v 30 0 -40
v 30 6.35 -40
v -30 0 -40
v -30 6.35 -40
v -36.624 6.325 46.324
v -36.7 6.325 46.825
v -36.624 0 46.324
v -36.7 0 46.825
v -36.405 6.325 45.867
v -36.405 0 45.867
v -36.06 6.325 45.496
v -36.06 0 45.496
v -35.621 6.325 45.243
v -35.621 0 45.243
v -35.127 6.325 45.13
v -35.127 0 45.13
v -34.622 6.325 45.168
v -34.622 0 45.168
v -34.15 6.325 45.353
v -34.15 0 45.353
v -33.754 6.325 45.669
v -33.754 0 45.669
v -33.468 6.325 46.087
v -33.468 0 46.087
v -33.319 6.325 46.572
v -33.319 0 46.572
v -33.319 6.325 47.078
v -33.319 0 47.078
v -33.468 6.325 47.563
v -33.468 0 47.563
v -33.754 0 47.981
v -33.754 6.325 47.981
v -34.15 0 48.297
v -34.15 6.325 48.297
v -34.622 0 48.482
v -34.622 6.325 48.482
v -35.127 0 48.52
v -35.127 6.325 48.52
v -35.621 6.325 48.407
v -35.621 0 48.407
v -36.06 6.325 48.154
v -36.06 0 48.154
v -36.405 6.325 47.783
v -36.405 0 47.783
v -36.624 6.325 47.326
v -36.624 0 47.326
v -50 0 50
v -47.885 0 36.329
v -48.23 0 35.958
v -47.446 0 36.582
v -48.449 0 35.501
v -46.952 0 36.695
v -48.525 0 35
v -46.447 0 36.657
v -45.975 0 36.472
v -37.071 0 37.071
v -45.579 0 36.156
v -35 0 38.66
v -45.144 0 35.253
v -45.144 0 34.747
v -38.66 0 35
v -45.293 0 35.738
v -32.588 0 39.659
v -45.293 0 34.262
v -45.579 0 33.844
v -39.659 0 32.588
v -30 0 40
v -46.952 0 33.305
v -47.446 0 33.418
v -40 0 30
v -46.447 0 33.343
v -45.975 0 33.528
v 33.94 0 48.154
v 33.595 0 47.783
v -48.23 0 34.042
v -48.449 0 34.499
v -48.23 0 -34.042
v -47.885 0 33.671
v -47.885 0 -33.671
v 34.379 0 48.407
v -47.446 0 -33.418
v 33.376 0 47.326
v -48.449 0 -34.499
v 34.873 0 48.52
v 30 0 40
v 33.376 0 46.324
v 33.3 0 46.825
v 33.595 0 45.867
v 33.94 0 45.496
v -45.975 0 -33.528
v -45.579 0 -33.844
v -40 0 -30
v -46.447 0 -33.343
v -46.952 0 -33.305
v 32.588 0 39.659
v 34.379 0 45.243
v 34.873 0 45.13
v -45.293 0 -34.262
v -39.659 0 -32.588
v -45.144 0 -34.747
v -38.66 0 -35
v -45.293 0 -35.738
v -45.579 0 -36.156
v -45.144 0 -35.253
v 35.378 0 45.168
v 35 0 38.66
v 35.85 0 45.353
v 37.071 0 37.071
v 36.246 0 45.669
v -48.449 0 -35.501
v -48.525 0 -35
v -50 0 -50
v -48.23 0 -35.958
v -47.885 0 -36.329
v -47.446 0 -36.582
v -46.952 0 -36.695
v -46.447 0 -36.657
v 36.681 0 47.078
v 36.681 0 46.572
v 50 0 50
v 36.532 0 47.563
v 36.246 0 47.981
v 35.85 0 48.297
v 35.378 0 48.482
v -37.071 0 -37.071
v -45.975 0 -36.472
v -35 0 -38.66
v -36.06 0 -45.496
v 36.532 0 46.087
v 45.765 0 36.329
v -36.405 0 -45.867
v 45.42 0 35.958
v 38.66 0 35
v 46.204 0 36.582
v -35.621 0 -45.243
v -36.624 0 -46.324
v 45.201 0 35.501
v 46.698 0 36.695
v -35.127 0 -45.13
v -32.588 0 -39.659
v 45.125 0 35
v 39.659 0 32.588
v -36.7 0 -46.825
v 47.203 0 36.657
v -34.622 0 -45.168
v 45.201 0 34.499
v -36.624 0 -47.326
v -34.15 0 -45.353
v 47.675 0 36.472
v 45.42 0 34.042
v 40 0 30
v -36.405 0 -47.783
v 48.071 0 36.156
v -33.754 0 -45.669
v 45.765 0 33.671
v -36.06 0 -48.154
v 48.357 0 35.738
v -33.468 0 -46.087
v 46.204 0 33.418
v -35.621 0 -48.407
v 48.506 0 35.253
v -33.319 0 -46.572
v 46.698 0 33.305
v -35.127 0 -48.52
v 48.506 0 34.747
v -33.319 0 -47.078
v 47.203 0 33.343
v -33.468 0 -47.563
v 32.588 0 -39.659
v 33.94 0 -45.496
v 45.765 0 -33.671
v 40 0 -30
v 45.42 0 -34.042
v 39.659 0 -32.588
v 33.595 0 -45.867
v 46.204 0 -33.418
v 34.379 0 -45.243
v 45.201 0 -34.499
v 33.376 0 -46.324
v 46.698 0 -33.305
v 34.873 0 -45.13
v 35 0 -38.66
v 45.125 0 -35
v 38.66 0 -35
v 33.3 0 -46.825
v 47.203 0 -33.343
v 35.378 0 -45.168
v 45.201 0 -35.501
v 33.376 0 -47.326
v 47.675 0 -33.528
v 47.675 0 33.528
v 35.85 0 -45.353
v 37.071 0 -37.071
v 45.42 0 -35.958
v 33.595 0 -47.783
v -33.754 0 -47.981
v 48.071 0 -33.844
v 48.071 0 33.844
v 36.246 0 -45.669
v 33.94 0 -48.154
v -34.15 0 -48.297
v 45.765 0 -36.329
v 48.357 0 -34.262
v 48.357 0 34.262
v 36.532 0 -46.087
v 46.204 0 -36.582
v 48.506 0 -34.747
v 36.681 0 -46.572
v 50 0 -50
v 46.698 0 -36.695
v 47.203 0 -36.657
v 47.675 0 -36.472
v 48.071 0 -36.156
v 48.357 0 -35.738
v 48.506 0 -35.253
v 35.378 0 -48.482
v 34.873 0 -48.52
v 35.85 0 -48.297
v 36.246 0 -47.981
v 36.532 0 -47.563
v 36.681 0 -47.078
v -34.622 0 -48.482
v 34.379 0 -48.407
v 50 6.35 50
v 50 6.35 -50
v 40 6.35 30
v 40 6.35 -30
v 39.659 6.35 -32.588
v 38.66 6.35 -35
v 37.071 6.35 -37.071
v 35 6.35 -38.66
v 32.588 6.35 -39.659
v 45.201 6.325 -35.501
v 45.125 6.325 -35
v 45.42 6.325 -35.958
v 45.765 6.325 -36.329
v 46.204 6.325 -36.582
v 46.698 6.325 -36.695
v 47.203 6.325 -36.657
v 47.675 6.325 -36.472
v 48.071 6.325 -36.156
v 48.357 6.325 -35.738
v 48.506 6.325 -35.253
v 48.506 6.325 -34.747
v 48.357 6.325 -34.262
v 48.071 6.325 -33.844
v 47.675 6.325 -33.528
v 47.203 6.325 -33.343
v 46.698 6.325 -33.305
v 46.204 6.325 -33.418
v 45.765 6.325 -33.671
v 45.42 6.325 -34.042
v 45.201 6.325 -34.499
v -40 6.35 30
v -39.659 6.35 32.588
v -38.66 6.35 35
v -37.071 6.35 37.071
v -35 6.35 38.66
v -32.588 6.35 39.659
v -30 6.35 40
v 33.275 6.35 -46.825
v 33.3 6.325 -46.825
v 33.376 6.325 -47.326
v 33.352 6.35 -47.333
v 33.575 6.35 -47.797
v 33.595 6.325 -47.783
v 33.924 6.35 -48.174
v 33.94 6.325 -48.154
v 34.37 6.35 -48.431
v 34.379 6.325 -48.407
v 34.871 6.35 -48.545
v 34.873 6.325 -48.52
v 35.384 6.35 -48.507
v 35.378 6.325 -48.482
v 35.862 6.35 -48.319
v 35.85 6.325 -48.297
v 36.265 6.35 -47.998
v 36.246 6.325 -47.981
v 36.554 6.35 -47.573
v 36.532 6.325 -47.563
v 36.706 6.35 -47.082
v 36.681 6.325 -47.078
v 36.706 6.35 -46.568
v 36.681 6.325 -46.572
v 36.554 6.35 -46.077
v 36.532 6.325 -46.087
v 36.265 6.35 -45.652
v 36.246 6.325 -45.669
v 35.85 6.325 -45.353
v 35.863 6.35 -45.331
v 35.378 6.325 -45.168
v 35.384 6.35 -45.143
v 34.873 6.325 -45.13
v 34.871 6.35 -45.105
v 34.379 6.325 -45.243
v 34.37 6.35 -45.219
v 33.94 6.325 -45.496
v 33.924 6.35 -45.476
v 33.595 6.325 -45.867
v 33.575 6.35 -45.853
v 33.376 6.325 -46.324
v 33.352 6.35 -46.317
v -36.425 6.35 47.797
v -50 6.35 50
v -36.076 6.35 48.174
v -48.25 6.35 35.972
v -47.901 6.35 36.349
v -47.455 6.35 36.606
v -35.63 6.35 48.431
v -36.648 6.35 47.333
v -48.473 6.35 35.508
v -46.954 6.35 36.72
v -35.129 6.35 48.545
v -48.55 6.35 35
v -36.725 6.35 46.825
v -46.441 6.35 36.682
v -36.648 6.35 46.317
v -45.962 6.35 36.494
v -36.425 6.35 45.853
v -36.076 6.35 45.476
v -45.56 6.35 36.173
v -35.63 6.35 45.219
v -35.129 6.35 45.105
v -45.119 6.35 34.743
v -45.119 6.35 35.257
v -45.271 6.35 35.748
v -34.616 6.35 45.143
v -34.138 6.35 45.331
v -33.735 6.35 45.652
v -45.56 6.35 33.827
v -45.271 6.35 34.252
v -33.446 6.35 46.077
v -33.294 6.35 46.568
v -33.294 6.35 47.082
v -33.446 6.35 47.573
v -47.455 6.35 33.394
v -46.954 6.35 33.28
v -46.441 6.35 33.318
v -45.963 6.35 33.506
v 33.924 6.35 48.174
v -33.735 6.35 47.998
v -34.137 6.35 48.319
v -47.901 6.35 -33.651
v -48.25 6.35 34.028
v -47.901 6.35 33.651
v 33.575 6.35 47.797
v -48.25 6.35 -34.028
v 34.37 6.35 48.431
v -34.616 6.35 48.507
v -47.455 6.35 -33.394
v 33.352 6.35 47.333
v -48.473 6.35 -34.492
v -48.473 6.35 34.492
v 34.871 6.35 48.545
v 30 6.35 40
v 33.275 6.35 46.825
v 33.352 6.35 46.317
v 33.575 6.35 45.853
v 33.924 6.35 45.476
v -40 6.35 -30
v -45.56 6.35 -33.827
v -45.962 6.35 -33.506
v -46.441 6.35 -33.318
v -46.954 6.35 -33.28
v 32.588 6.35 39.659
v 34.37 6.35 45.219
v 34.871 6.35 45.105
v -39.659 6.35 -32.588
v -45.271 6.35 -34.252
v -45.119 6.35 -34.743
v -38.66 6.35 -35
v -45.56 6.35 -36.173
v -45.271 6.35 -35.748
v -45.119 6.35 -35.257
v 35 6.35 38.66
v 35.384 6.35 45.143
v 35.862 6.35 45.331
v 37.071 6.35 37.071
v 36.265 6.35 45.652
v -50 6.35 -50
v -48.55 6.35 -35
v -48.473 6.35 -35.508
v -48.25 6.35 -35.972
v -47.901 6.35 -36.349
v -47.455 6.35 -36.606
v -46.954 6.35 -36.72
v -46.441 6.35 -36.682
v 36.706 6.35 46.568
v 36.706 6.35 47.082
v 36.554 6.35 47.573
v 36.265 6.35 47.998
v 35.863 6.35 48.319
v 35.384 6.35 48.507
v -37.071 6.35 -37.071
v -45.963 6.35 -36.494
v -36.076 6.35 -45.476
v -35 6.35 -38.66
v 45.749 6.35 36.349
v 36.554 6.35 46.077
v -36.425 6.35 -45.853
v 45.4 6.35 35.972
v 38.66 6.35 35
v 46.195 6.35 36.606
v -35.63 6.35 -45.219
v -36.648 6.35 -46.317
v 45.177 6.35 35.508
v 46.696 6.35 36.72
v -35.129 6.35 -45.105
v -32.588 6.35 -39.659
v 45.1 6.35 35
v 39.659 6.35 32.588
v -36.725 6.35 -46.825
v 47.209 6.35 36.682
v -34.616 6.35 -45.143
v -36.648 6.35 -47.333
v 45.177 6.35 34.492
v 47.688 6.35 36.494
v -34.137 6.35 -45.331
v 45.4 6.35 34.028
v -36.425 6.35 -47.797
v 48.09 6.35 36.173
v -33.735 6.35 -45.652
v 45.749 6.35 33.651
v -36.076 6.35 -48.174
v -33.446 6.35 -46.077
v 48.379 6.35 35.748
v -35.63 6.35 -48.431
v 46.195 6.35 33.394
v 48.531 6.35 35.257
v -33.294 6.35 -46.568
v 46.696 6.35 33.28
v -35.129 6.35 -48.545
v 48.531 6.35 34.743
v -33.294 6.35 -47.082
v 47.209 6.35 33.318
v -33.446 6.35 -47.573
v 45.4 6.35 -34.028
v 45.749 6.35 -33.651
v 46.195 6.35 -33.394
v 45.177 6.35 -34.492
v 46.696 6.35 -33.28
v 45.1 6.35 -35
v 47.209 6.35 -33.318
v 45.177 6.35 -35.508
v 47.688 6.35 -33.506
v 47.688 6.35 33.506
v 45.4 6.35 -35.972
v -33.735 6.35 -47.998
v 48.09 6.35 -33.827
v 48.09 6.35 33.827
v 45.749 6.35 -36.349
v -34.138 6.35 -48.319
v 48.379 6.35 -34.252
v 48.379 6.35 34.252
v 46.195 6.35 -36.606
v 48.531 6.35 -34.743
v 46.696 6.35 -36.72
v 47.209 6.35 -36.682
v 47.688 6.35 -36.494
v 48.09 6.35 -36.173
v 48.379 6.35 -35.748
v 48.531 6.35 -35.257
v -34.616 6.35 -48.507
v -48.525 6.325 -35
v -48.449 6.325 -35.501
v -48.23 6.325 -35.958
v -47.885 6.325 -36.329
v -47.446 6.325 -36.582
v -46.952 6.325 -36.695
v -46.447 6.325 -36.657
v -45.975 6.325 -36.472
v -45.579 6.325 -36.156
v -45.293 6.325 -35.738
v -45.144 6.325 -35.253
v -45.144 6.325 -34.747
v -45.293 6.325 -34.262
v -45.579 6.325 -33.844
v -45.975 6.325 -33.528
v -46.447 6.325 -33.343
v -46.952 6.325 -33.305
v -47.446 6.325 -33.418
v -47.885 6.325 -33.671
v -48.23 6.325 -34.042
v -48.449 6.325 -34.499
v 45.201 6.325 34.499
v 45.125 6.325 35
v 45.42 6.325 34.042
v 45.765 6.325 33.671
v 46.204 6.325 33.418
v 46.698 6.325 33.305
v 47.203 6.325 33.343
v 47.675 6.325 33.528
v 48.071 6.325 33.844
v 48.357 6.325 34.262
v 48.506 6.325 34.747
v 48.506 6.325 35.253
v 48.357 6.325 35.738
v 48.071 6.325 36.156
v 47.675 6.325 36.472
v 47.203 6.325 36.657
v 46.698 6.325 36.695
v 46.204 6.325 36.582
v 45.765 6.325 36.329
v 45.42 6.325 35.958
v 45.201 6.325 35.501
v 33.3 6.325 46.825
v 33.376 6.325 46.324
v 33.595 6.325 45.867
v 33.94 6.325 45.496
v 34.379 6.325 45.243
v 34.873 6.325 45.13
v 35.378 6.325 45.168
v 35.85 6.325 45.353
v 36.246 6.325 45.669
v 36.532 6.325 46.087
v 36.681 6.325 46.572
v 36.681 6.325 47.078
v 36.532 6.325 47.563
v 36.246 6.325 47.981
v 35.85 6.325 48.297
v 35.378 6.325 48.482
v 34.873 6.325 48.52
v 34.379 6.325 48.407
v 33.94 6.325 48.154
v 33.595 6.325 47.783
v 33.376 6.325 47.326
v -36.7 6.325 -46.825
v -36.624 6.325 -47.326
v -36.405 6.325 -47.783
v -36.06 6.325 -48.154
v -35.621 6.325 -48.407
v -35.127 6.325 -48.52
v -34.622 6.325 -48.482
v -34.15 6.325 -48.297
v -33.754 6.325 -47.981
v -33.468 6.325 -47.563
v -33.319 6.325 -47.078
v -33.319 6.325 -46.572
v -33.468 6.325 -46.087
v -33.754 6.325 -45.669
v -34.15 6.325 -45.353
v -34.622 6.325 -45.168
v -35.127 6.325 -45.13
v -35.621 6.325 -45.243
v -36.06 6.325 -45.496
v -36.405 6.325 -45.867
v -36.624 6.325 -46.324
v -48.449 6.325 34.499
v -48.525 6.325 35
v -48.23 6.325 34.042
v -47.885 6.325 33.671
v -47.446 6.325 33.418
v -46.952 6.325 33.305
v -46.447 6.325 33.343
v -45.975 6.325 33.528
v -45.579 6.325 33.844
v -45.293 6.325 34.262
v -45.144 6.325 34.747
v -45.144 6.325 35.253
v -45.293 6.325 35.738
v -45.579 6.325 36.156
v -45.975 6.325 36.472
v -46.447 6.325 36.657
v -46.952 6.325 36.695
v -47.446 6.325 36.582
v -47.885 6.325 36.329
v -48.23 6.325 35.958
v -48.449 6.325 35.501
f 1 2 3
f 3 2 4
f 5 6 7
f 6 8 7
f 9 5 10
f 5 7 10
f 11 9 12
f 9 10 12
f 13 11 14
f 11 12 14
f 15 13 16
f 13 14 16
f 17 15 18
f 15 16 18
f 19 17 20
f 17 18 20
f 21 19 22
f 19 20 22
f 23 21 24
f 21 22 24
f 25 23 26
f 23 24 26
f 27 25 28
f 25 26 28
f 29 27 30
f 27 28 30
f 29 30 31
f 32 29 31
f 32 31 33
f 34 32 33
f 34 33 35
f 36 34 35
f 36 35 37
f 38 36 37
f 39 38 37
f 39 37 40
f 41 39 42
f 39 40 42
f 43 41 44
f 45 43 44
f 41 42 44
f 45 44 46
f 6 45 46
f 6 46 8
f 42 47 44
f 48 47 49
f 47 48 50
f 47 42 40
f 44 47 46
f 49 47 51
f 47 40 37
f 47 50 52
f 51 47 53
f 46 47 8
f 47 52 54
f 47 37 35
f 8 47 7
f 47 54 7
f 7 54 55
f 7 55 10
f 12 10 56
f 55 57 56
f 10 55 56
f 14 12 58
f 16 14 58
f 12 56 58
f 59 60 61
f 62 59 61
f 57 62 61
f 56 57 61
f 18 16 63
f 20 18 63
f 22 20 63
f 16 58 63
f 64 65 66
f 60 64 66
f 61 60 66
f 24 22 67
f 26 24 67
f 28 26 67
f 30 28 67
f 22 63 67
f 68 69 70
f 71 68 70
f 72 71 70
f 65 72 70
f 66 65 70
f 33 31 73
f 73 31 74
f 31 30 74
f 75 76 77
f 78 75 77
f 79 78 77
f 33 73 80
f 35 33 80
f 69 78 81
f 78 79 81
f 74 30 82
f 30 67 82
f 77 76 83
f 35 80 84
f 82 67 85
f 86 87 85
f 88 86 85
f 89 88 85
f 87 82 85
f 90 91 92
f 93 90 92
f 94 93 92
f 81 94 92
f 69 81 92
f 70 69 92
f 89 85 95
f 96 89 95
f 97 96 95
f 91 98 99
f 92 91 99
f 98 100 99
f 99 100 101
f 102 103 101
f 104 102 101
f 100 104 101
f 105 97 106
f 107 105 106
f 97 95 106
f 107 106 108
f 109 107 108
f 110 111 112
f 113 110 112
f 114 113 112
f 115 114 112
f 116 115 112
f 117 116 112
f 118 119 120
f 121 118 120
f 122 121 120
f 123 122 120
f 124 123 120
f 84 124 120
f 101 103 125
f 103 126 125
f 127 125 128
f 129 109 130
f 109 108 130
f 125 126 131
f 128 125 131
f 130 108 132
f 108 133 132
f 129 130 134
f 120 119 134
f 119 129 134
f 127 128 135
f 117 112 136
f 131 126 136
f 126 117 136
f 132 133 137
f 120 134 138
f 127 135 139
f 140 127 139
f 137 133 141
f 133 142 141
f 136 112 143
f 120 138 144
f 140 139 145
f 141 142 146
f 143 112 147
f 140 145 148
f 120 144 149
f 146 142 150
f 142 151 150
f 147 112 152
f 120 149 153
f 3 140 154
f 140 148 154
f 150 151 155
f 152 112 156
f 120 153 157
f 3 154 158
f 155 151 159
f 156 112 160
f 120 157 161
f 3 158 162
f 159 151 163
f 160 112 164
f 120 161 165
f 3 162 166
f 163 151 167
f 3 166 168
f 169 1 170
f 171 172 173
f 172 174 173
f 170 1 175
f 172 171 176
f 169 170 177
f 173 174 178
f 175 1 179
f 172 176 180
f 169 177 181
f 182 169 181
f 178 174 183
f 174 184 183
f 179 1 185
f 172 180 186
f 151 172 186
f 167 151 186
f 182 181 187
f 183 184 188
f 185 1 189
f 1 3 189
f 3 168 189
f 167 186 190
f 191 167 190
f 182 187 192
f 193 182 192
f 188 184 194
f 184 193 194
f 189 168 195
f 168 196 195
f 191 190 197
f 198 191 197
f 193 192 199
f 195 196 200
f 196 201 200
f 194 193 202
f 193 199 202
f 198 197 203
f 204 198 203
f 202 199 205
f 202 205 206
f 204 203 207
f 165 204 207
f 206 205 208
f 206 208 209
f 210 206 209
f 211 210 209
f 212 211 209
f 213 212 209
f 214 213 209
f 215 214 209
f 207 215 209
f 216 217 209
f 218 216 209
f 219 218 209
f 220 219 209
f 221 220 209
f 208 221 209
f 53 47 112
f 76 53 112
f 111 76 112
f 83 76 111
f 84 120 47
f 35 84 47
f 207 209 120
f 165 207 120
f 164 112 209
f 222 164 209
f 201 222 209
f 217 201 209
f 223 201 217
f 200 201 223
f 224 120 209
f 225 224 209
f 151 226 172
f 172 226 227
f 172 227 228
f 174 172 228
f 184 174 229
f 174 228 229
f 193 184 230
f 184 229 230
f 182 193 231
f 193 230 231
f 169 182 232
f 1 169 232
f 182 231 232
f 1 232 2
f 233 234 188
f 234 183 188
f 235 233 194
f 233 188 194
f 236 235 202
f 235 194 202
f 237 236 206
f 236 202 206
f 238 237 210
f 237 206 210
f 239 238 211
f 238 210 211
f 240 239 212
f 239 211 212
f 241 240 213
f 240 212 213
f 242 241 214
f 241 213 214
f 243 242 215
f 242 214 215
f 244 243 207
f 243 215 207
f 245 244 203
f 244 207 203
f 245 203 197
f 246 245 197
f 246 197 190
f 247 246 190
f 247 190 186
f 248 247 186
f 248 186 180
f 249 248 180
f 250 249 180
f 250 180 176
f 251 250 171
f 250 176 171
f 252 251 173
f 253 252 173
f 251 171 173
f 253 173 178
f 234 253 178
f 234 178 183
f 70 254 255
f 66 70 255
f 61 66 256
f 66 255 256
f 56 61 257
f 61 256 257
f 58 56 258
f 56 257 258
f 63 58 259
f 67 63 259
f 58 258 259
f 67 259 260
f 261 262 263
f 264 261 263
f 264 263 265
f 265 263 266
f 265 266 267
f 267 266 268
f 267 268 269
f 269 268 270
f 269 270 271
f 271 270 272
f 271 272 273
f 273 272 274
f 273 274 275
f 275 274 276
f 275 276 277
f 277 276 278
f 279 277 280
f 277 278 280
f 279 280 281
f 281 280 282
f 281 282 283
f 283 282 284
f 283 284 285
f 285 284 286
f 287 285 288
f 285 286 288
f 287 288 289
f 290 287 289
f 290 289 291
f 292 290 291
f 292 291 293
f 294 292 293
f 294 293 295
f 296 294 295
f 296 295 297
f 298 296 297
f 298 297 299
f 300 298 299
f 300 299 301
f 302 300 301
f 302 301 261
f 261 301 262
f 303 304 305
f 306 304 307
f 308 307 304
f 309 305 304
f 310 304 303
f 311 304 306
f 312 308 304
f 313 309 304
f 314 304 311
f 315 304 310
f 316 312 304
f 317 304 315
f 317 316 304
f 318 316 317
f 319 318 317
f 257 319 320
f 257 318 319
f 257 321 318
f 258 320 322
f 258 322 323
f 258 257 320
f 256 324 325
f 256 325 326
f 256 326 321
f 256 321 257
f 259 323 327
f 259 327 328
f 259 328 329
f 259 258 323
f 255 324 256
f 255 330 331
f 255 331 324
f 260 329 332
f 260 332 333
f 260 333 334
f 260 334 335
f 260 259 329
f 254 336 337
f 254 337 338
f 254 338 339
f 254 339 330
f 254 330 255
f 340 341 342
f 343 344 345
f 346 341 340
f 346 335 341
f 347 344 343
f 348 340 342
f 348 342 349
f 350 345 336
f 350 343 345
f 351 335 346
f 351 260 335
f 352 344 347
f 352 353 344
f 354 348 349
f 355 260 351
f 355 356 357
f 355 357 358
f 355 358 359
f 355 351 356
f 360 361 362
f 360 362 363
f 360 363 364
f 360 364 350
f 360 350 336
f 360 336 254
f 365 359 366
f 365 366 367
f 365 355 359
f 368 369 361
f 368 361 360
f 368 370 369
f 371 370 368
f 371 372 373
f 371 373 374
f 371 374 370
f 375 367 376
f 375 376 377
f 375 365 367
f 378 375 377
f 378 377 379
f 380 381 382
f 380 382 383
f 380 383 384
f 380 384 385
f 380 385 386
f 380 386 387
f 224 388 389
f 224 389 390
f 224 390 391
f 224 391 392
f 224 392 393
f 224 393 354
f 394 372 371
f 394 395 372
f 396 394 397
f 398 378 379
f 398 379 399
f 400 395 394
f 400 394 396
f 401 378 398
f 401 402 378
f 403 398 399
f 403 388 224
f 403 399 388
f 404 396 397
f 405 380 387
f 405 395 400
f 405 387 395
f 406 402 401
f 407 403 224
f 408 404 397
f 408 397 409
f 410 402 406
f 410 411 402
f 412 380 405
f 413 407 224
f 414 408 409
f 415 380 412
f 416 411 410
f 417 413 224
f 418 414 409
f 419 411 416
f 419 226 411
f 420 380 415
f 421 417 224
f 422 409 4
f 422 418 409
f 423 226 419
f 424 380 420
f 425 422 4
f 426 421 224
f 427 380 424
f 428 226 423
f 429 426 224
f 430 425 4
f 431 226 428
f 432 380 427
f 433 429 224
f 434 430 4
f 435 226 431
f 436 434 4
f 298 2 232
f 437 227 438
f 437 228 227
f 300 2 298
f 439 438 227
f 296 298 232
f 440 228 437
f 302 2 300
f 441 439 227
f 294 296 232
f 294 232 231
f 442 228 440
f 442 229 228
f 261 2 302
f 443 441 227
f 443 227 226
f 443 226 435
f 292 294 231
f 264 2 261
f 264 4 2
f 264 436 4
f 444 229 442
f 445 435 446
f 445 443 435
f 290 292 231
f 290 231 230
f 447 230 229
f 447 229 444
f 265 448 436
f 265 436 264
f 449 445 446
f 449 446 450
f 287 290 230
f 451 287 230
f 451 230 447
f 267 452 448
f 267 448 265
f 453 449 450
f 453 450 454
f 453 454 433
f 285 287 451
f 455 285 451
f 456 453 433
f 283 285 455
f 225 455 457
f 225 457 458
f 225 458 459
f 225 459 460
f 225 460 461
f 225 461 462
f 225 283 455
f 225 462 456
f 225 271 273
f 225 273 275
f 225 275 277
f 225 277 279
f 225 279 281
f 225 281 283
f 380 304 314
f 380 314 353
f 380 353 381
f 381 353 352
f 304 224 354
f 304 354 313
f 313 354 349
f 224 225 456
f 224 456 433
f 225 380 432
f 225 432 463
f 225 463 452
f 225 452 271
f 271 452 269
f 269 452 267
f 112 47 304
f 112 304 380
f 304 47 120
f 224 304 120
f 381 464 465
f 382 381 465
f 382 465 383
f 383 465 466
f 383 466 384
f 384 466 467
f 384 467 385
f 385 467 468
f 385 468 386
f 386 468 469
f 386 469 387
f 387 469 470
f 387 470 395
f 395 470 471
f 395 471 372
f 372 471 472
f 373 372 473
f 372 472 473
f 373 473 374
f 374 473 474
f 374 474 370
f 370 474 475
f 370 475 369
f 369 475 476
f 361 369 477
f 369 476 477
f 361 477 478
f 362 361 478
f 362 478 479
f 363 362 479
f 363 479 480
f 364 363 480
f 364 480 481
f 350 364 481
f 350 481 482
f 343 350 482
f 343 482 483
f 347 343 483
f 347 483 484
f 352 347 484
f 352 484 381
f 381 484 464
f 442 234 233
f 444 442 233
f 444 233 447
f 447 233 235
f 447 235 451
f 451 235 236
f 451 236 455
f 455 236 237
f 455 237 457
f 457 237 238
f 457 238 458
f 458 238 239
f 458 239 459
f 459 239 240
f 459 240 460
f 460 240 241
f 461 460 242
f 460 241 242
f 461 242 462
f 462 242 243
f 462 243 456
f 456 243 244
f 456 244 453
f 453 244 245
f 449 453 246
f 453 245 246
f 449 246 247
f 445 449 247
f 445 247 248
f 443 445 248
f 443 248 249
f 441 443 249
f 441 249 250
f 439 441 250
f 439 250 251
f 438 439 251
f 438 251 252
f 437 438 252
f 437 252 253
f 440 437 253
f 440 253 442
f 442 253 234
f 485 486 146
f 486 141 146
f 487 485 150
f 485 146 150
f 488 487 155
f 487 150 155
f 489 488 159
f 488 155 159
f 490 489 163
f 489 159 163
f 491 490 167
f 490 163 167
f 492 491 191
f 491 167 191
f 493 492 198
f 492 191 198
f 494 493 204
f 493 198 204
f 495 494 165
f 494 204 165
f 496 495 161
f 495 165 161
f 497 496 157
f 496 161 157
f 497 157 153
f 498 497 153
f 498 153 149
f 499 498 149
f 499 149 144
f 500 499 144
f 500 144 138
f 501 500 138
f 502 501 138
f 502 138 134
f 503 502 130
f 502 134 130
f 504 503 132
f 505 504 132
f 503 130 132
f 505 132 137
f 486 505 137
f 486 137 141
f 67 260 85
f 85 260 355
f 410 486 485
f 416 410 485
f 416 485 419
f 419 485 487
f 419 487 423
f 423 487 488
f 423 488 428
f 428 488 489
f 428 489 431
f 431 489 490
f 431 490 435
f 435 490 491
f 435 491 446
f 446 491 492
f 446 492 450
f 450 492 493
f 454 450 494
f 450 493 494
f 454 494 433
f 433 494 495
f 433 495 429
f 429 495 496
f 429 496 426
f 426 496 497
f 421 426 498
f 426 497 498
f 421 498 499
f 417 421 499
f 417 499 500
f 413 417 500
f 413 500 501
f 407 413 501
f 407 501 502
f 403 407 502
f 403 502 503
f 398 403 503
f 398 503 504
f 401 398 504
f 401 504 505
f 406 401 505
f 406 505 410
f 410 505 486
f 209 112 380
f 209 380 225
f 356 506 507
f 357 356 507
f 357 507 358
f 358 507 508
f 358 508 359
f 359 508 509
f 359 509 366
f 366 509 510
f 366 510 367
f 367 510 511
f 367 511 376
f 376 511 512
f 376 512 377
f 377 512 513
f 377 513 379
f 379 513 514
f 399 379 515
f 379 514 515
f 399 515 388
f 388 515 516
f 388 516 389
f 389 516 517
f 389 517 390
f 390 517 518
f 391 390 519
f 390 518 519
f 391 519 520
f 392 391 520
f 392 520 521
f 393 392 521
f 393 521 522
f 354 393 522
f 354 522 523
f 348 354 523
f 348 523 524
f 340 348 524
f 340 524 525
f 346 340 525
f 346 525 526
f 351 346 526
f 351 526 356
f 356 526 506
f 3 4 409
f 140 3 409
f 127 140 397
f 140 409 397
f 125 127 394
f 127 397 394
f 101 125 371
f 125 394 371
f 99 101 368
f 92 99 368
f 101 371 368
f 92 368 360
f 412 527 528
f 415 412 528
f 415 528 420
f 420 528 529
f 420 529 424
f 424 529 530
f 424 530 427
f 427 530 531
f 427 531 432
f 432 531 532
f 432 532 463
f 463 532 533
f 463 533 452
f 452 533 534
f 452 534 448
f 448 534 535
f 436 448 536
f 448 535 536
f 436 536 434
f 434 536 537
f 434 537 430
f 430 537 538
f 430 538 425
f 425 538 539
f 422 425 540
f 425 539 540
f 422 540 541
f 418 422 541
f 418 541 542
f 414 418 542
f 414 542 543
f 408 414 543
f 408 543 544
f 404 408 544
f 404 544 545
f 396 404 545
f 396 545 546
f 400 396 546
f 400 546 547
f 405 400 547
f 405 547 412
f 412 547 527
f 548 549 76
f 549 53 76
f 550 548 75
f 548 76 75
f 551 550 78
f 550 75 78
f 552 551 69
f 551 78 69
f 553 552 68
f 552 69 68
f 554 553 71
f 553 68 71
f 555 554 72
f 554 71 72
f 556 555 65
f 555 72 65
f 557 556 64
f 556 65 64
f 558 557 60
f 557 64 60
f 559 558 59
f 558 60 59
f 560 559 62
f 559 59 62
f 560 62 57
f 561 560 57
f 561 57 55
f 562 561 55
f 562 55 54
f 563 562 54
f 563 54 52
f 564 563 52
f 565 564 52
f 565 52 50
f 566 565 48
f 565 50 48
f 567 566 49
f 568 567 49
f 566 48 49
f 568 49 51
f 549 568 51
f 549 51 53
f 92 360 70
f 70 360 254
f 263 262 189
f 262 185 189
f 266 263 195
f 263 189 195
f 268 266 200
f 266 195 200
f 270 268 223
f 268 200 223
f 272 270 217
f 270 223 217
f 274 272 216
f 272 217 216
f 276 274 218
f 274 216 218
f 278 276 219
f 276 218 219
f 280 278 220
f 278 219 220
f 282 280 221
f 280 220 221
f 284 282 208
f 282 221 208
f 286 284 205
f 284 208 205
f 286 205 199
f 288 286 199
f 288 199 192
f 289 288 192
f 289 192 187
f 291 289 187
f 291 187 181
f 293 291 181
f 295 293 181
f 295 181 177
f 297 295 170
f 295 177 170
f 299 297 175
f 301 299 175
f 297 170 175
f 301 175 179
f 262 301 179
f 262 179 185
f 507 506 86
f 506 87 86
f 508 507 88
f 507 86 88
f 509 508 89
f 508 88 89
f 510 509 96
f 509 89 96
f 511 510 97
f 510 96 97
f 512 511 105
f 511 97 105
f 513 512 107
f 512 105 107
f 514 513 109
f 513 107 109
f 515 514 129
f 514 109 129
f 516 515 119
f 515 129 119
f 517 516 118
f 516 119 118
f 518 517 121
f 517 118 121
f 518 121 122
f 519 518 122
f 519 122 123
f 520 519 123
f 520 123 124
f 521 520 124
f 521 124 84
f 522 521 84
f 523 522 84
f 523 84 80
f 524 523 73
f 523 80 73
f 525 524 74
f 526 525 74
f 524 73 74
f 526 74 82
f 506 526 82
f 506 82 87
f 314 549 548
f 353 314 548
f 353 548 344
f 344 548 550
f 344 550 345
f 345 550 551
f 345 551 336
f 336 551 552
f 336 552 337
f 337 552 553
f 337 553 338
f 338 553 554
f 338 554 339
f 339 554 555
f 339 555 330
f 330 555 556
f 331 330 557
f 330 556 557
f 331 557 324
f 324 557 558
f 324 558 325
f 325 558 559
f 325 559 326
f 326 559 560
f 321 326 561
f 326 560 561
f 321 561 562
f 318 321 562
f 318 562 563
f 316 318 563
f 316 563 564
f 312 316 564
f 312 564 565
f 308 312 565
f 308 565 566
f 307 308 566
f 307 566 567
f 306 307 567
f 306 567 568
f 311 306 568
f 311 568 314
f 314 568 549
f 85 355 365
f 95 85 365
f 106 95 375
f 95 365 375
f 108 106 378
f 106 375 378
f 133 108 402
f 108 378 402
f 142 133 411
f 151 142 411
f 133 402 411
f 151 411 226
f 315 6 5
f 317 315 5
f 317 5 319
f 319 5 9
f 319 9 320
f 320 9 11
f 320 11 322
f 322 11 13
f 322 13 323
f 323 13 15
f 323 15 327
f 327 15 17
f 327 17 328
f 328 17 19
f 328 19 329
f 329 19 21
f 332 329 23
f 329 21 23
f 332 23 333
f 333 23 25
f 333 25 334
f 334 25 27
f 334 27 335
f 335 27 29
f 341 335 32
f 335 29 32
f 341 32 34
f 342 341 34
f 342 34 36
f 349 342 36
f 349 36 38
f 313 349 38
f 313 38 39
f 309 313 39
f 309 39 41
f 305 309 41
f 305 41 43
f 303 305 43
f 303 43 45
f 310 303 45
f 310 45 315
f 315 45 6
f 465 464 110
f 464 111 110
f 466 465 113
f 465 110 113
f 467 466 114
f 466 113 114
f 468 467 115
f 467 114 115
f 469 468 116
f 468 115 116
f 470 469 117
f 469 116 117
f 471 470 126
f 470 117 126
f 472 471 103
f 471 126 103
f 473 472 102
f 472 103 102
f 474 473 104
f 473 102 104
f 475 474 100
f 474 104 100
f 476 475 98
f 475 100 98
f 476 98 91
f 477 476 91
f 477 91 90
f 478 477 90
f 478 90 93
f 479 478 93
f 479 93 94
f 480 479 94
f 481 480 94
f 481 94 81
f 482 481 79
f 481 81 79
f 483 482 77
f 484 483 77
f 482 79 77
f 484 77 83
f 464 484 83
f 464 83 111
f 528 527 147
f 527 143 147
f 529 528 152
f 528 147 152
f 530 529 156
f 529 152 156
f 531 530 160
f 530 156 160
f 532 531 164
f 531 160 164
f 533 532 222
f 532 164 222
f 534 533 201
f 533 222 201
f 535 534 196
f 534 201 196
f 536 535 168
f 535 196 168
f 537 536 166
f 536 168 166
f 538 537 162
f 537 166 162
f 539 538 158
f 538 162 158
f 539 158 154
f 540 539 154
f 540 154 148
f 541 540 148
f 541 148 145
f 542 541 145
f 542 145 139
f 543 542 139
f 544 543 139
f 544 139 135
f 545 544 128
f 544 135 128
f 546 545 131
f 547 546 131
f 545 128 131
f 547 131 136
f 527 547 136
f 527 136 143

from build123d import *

# Parameters (mm, degrees)
SKETCH1_W                      = 100
SKETCH1_H                      = 100
BOSS_EXTRUDE3_DEPTH            = 6.35
M3_CLEARANCE_HOLE1_D           = 3.4
M3_CLEARANCE_HOLE1_CSINK_D     = 3.45
M3_CLEARANCE_HOLE1_CSINK_ANGLE = 90
CUT_EXTRUDE1_DEPTH             = 10


with BuildPart() as part:
    # Sketch1 → Boss-Extrude3 (new body)
    with BuildSketch(Plane(origin=(0, 0, 0), x_dir=(1, 0, 0), z_dir=(0, 1, 0))):
        Rectangle(SKETCH1_W, SKETCH1_H)
    extrude(amount=BOSS_EXTRUDE3_DEPTH)

    # M3 Clearance Hole1 (through all)
    with Locations(Plane(origin=(0, 6.35, 0), x_dir=(1, 0, 0), z_dir=(0, 1, 0))):
        with Locations((-46.825, 35), (-35, 46.825), (35, 46.825), (46.825, 35), (46.825, -35), (35, -46.825), (-35, -46.825), (-46.825, -35)):
            CounterSinkHole(M3_CLEARANCE_HOLE1_D / 2, M3_CLEARANCE_HOLE1_CSINK_D / 2, counter_sink_angle=M3_CLEARANCE_HOLE1_CSINK_ANGLE)

    # Sketch19 → Cut-Extrude1 (cut)
    with BuildSketch(Plane(origin=(0, 6.35, 0), x_dir=(1, 0, 0), z_dir=(0, 1, 0))):
        with BuildLine():
            Line((-30, -40), (30, -40))
            ThreePointArc((30, -40), (37.071067812, -37.071067812), (40, -30))
            Line((40, -30), (40, 30))
            ThreePointArc((40, 30), (37.071067812, 37.071067812), (30, 40))
            Line((30, 40), (-30, 40))
            ThreePointArc((-30, 40), (-37.071067812, 37.071067812), (-40, 30))
            Line((-40, 30), (-40, -30))
            ThreePointArc((-40, -30), (-37.071067812, -37.071067812), (-30, -40))
        make_face()
    extrude(amount=-CUT_EXTRUDE1_DEPTH, mode=Mode.SUBTRACT)


solid = part.part
